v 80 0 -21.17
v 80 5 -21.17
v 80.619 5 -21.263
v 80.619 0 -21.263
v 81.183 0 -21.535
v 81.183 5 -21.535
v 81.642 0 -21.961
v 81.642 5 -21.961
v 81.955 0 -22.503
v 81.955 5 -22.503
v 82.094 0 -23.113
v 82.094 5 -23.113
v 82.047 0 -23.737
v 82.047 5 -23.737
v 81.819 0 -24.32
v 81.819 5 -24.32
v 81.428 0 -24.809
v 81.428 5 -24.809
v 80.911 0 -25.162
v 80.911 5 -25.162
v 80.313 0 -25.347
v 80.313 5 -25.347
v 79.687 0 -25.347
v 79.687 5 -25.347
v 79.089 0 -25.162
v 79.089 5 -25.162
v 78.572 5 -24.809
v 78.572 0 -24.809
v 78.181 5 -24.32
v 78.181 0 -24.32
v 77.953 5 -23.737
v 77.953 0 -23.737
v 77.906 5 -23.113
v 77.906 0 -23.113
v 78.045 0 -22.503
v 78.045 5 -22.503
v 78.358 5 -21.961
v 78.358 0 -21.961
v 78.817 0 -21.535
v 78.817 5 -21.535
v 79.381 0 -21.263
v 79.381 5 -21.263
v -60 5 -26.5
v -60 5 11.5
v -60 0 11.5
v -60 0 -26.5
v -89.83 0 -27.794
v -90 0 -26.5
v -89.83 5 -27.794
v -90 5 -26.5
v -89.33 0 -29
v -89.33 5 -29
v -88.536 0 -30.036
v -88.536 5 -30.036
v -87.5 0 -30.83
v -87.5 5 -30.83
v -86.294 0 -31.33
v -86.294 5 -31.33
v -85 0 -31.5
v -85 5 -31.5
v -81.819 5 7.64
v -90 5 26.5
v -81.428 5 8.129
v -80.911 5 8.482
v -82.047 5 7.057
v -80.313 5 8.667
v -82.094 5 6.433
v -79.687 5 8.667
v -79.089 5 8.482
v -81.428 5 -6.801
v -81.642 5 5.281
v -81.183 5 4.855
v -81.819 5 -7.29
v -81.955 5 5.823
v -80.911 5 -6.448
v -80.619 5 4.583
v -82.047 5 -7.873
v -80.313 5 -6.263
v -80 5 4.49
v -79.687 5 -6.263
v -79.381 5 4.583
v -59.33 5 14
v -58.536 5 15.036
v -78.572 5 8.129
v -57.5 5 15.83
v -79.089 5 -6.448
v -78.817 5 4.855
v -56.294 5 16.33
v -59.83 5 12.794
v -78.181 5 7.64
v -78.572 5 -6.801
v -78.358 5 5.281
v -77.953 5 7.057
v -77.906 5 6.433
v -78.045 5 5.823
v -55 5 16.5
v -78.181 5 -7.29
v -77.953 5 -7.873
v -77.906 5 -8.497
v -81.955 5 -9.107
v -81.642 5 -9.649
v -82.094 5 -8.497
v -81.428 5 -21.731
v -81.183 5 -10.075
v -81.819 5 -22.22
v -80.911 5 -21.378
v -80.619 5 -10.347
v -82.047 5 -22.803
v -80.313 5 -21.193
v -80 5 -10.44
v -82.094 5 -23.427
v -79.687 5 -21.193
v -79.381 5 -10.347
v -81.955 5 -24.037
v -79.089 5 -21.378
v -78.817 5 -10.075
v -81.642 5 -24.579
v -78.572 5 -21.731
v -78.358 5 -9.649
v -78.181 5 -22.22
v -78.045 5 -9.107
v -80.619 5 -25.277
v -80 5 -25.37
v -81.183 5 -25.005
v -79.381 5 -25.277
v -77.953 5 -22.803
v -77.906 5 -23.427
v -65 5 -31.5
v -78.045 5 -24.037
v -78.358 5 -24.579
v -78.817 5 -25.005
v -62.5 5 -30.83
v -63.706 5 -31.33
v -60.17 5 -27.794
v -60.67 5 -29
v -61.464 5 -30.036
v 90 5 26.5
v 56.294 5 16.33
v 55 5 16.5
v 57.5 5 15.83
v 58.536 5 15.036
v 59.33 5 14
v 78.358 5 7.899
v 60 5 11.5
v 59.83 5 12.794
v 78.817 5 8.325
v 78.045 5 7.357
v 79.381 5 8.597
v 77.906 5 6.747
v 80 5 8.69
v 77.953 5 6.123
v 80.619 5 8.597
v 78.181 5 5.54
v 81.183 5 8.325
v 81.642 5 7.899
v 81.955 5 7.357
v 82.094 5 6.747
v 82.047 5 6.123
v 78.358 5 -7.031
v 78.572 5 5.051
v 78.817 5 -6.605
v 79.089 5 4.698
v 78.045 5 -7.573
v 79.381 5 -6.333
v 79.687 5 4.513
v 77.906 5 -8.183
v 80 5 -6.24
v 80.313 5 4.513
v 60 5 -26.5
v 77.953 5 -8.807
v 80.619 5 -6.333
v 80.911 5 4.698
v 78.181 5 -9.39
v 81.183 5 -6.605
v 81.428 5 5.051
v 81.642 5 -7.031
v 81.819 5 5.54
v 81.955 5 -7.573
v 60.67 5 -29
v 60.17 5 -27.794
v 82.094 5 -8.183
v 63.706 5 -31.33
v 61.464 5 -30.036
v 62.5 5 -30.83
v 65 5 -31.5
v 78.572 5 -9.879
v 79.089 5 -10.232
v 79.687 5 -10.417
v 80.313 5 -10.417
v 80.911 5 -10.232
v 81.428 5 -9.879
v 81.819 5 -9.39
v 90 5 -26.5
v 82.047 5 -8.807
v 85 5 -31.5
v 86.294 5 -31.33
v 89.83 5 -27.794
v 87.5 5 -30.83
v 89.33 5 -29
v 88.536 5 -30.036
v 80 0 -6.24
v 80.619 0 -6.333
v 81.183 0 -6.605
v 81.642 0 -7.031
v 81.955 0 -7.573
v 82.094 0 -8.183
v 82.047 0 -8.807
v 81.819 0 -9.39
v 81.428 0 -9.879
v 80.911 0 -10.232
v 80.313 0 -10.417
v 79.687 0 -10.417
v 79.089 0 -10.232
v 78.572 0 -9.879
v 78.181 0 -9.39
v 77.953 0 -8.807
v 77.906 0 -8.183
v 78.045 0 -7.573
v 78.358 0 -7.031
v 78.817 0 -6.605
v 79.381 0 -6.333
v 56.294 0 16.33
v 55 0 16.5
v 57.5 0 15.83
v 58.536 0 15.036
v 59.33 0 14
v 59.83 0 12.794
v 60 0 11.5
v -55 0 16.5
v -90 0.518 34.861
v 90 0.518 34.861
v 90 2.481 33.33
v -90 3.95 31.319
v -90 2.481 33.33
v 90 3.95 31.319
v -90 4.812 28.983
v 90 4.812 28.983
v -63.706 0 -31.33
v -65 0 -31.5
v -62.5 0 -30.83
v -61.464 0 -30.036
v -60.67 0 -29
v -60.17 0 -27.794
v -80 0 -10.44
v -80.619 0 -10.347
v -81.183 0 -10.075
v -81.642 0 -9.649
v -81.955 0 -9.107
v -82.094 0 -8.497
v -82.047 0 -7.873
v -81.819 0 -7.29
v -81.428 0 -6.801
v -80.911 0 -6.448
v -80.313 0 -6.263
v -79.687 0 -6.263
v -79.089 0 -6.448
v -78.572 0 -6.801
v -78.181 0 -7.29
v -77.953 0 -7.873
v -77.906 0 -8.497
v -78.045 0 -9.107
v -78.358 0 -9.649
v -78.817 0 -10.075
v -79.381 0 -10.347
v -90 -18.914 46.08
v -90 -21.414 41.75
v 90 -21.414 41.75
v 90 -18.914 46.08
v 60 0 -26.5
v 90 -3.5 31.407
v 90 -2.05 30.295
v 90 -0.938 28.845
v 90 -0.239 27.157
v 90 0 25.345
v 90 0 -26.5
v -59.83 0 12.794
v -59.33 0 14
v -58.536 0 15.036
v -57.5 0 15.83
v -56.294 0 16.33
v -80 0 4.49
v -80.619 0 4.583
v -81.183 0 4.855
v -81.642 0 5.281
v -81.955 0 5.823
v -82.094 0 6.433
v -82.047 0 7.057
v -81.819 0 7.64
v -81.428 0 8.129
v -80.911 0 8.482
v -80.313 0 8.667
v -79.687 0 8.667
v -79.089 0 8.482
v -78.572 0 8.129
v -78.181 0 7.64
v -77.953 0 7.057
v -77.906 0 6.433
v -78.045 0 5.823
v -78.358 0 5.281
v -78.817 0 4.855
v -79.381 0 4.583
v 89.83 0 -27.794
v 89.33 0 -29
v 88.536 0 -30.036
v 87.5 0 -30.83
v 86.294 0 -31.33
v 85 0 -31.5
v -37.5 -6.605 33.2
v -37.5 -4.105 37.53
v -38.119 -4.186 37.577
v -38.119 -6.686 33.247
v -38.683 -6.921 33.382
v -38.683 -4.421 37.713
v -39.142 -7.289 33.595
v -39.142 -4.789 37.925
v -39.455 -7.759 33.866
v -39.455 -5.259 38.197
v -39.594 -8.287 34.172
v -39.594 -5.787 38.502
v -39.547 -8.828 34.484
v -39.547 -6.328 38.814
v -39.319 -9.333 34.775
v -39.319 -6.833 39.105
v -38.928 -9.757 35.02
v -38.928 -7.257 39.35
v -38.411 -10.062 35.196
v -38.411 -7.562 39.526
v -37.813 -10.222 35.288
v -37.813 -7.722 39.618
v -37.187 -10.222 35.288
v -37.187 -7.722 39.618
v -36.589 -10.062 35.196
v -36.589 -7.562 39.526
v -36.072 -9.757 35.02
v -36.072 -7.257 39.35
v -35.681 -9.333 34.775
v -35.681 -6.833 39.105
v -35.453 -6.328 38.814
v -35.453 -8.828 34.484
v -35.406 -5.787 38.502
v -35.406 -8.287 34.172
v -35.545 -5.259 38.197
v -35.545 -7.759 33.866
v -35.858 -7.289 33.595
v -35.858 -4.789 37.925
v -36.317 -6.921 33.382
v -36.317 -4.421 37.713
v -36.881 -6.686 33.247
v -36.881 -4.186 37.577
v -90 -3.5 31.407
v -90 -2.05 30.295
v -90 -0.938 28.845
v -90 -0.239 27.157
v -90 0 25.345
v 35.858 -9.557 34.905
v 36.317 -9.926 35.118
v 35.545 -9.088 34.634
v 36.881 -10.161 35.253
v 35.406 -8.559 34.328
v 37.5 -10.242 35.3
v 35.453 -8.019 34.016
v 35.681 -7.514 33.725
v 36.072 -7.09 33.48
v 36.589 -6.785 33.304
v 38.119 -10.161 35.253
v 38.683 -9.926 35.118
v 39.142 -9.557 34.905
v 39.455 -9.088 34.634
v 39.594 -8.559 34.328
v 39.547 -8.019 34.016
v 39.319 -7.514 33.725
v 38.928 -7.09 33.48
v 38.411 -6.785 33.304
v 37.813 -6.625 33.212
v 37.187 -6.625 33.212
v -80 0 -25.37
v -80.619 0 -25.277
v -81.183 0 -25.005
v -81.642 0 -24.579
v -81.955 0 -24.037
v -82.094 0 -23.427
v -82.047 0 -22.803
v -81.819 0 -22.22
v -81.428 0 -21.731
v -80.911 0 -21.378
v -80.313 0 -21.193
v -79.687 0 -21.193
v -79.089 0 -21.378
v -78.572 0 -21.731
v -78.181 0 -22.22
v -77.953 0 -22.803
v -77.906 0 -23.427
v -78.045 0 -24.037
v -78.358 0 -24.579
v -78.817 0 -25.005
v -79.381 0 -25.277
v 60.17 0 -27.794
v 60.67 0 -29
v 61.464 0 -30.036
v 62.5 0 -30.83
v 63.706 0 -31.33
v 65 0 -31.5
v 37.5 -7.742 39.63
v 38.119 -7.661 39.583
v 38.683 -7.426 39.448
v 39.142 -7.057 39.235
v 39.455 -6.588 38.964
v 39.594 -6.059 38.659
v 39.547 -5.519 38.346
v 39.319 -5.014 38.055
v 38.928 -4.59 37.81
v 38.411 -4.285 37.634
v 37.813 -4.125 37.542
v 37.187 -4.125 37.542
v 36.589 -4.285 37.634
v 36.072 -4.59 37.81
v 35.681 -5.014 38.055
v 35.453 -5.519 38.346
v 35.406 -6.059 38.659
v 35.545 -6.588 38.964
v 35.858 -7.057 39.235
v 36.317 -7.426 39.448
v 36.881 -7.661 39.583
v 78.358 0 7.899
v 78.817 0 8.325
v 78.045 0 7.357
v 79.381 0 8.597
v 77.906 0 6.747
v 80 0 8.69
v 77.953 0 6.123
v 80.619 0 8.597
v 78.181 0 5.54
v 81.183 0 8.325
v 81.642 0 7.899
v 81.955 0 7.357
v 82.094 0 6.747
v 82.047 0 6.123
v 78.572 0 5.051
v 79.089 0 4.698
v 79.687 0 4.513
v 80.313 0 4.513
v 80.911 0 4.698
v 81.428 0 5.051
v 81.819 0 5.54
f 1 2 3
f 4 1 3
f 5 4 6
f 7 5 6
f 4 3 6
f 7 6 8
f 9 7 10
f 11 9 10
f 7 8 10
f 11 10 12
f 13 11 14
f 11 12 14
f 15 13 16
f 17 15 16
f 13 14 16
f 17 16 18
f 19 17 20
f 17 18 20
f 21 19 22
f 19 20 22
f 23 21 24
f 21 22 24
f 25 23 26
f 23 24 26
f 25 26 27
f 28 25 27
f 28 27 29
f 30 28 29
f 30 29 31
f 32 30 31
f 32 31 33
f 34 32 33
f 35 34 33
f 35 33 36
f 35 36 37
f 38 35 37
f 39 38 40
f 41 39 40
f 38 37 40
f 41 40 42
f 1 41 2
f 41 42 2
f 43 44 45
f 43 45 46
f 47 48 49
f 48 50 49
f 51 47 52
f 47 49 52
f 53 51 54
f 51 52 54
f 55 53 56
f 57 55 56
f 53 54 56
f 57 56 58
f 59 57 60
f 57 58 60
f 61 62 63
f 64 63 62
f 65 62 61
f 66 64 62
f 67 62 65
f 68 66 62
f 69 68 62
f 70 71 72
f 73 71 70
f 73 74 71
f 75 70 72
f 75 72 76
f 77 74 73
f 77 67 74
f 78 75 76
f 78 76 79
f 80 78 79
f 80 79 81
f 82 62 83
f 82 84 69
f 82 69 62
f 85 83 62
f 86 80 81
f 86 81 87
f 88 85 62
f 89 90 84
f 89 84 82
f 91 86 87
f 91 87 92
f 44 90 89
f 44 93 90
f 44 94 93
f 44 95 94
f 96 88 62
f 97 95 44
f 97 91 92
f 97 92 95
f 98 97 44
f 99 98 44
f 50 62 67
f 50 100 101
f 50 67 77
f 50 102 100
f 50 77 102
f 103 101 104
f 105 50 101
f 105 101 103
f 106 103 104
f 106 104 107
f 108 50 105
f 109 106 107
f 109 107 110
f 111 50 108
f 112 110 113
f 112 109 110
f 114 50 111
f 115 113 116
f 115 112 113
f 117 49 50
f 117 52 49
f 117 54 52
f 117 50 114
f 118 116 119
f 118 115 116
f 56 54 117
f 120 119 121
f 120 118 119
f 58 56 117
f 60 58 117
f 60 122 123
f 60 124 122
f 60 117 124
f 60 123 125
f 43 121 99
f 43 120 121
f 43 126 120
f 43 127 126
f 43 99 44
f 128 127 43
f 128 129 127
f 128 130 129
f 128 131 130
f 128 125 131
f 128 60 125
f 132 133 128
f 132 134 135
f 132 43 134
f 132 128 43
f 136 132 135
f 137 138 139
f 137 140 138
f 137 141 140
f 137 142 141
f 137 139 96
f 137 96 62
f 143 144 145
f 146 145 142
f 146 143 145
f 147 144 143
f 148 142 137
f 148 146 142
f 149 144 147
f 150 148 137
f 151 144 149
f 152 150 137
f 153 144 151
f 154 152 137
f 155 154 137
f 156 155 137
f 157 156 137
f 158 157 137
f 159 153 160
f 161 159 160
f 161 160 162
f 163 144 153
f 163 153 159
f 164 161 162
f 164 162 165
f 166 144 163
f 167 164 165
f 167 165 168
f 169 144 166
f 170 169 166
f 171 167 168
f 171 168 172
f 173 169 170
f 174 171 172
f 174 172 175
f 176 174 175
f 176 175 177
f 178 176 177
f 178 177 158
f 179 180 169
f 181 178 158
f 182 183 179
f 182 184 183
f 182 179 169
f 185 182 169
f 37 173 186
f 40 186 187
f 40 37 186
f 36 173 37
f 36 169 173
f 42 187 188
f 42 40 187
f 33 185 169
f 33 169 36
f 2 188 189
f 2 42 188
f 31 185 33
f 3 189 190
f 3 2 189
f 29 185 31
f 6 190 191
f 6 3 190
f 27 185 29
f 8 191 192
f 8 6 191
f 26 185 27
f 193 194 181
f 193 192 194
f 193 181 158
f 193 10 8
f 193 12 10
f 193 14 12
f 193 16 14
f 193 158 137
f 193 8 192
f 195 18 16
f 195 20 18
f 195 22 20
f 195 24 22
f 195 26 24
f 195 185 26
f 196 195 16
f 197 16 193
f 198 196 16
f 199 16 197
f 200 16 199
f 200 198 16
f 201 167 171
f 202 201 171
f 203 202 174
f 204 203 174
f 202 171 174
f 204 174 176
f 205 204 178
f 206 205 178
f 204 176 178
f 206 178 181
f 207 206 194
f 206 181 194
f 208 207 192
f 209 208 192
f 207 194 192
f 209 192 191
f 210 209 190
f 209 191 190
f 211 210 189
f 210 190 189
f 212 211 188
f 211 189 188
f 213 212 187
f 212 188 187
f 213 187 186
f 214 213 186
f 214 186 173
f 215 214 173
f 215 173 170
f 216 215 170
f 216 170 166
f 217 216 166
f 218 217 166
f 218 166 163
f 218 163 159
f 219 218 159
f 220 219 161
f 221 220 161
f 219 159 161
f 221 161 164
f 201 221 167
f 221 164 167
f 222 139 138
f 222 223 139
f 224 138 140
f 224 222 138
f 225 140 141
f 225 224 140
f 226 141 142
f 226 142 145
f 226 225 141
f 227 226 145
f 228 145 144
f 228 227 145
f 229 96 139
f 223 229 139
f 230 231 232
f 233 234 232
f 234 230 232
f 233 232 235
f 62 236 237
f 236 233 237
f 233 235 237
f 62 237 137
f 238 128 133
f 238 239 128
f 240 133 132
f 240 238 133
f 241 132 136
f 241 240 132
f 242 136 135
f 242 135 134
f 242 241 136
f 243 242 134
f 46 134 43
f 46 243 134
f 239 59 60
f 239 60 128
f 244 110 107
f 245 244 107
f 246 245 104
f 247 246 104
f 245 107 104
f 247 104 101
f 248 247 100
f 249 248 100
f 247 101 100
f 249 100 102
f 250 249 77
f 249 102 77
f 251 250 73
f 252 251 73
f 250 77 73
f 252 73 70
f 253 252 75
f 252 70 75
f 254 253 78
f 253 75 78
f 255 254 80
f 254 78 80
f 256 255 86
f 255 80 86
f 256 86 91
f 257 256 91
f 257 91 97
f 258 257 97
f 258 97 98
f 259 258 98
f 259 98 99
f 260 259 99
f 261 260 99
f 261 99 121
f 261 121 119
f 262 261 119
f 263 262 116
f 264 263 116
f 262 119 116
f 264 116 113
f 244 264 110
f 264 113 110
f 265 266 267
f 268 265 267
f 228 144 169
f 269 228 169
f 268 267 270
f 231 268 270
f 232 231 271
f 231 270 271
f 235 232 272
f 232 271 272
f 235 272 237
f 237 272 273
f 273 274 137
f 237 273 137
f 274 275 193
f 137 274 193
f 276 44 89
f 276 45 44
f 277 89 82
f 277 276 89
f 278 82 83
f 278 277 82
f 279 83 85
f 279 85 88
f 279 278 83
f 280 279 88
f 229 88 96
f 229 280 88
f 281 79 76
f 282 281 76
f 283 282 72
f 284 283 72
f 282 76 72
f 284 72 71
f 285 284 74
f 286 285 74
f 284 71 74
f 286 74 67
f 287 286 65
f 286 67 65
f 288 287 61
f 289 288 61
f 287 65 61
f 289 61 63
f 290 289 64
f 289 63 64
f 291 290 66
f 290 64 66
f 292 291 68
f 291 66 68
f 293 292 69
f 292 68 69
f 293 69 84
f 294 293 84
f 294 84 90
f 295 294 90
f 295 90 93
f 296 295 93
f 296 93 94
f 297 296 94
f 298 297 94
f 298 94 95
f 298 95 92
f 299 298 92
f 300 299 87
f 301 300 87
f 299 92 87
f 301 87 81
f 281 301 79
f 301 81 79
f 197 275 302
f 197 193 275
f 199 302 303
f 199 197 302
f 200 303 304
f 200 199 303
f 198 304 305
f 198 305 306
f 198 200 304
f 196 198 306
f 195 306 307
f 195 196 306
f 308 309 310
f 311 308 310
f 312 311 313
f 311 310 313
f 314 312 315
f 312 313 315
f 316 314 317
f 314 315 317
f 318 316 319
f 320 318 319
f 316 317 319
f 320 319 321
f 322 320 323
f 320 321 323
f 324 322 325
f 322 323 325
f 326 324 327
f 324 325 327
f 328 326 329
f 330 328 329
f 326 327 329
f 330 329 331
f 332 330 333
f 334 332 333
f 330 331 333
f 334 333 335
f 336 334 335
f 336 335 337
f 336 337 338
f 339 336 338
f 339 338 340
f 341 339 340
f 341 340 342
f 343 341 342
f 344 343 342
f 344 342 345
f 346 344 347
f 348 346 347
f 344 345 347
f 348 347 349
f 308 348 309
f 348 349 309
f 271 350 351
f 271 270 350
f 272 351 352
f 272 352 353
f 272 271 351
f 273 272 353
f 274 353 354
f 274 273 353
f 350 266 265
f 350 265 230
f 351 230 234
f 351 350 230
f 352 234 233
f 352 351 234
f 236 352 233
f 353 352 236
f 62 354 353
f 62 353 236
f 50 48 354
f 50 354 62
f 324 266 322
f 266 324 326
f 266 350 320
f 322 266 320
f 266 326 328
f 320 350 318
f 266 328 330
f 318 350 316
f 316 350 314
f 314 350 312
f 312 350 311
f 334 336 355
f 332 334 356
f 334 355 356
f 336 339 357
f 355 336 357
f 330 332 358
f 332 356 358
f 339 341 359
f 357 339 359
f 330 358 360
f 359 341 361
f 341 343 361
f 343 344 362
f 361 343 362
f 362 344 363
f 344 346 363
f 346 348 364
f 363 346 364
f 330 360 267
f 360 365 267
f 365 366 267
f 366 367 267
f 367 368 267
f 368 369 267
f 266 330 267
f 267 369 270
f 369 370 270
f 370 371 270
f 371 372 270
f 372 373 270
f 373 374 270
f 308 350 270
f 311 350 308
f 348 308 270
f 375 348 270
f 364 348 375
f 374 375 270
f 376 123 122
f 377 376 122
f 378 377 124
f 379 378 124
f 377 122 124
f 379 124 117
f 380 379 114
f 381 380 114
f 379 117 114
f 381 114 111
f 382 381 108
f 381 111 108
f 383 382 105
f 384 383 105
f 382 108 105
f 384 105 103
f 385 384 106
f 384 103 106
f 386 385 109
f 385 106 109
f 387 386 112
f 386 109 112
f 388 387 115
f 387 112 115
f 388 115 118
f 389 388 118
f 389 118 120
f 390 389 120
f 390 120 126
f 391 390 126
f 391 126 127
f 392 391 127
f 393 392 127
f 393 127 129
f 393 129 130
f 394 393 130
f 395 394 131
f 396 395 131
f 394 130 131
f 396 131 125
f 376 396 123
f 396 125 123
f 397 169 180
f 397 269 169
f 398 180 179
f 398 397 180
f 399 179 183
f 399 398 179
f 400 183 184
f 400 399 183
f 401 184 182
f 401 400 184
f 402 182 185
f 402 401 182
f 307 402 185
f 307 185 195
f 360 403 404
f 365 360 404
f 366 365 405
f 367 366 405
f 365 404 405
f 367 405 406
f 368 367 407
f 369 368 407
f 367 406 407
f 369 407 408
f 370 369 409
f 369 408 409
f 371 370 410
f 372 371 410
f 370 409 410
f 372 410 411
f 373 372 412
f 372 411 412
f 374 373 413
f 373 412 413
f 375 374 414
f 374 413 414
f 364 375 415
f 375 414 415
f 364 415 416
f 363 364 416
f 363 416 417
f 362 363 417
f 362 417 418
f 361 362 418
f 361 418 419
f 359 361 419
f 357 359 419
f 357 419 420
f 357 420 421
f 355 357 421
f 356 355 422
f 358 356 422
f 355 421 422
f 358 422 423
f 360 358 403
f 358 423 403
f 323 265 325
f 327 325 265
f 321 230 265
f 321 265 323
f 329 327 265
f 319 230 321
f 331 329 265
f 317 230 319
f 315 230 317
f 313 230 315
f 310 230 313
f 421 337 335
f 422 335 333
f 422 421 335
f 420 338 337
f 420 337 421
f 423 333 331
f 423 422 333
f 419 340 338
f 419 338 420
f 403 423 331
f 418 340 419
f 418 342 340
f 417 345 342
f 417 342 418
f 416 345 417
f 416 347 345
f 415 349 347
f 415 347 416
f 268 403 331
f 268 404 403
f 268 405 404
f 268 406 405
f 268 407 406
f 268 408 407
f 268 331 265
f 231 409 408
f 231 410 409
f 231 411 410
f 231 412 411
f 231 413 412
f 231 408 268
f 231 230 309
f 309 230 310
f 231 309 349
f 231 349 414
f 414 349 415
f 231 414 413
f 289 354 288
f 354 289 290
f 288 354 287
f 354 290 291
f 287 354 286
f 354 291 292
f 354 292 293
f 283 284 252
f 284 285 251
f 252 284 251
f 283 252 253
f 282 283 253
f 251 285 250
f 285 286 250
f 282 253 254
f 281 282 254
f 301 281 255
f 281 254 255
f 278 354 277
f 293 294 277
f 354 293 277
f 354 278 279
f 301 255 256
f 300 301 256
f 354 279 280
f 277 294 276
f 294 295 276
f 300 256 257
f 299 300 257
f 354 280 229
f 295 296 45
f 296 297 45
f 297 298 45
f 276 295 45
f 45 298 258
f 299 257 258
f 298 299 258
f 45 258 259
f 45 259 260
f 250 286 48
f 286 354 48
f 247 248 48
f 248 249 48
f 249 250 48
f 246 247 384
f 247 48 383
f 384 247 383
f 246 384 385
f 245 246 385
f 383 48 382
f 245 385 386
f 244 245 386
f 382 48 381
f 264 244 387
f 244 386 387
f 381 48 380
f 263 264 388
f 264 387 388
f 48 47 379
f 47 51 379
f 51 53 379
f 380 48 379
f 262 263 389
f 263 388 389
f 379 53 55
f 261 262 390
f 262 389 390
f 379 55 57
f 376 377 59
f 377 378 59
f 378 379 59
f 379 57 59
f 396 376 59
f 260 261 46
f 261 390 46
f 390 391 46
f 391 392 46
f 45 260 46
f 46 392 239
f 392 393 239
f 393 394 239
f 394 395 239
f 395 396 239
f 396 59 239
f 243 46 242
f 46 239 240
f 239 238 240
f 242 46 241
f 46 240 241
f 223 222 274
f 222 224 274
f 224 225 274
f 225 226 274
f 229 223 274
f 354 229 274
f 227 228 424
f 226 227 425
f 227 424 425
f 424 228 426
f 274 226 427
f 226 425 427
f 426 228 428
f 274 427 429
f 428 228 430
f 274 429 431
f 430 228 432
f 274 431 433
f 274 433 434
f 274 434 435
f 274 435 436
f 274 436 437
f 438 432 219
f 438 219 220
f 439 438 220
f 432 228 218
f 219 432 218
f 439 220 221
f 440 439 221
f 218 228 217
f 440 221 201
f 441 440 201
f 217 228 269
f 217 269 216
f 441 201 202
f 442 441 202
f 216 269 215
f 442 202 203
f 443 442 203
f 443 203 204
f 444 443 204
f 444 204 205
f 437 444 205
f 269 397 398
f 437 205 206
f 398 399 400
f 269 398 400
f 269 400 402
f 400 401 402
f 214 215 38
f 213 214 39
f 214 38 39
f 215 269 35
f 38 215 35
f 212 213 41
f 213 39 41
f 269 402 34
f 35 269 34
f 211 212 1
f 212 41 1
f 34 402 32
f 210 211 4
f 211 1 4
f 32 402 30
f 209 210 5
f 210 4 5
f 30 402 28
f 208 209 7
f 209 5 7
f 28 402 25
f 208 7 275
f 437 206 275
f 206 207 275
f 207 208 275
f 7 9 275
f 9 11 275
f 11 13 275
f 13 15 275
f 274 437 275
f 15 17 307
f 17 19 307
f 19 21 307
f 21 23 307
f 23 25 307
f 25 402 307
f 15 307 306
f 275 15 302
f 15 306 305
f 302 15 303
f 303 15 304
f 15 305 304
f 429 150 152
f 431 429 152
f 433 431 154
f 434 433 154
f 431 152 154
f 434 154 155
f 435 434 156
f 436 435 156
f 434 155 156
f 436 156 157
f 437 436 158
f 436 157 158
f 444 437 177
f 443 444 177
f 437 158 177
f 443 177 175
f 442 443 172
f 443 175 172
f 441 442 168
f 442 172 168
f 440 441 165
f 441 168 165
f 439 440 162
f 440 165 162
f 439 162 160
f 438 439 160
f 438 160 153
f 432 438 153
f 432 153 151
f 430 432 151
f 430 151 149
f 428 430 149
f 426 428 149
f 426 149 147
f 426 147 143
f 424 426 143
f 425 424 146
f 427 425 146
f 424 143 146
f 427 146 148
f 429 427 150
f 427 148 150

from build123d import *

# Parameters (mm, degrees)
SKETCH_1_W          = 180
SKETCH_1_H          = 63
EXTRUDE_1_DEPTH     = 5
SKETCH_2_R          = 2.1
CUT_EXTRUDE_1_DEPTH = 5
CUT_EXTRUDE_2_DEPTH = 200
SKETCH_5_W          = 180
SKETCH_5_H          = 30.5
EXTRUDE_2_DEPTH     = 5
SKETCH_7_R          = 2.1
CUT_EXTRUDE_3_DEPTH = 5
FILLET_3_R          = 9
FILLET_4_R          = 7
SKETCH_8_W          = 120
SKETCH_8_H          = 50
CUT_EXTRUDE_4_DEPTH = 5
FILLET_5_R          = 5


with BuildPart() as part:
    # 草图1 → 凸台-拉伸1 (new body)
    with BuildSketch(Plane(origin=(0, 0, 0), x_dir=(1, 0, 0), z_dir=(0, 1, 0))):
        Rectangle(SKETCH_1_W, SKETCH_1_H)
    extrude(amount=EXTRUDE_1_DEPTH)

    # 草图2 → 切除-拉伸1 (cut)
    with BuildSketch(Plane(origin=(0, 5, 0), x_dir=(1, 0, 0), z_dir=(0, 1, 0))):
        with Locations(Location((80, 23.27, 0), (0, 0, 270))):
            Circle(SKETCH_2_R)
        with Locations(Location((80, 8.34, 0), (0, 0, 270))):
            Circle(SKETCH_2_R)
        with Locations(Location((80, -6.59, 0), (0, 0, 270))):
            Circle(SKETCH_2_R)
        with Locations(Location((-80, 23.27, 0), (0, 0, 90))):
            Circle(SKETCH_2_R)
        with Locations(Location((-80, 8.34, 0), (0, 0, 90))):
            Circle(SKETCH_2_R)
        with Locations(Location((-80, -6.59, 0), (0, 0, 90))):
            Circle(SKETCH_2_R)
    extrude(amount=-CUT_EXTRUDE_1_DEPTH, mode=Mode.SUBTRACT)

    # 草图3 → 切除-拉伸2 (cut)
    with BuildSketch(Plane.ZY.offset(90)):
        Polygon((26.5, 5), (29.386751346, 0), (31.5, 0), (31.5, 5), align=None)
    extrude(amount=-CUT_EXTRUDE_2_DEPTH, mode=Mode.SUBTRACT)

    # 草图5 → 凸台-拉伸2 (add)
    with BuildSketch(Plane(origin=(0, 12.7248366, 22.040063509), x_dir=(1, 0, 0), z_dir=(0, 0.49999999999999806, 0.8660254037844399))):
        with Locations((0, -24.169872981)):
            Rectangle(SKETCH_5_W, SKETCH_5_H)
    extrude(amount=EXTRUDE_2_DEPTH)

    # 草图7 → 切除-拉伸3 (cut)
    with BuildSketch(Plane(origin=(0, 15.2248366, 26.370190528), x_dir=(1, 0, 0), z_dir=(0, 0.4999999999999981, 0.8660254037844397))):
        with Locations(Location((37.5, -24.419872981, 0), (0, 0, 270))):
            Circle(SKETCH_7_R)
        with Locations(Location((-37.5, -24.419872981, 0), (0, 0, 90))):
            Circle(SKETCH_7_R)
    extrude(amount=-CUT_EXTRUDE_3_DEPTH, mode=Mode.SUBTRACT)

    # 圆角3
    # the kernel refuses this fillet: 9 mm, written as the material it takes off along each edge
    with BuildSketch(Plane(origin=(110.155644371, 7.5, 30.830127019), x_dir=(0, -0.8660254037844398, 0.499999999999998), z_dir=(-1, 0, 0))) as fillet_3_piece_1:
        with BuildLine():
            CenterArc((8.062257748, -9), FILLET_3_R, 90, 63.612200039)
            Line((0, -5), (-0.161245155, -4.92))
            ThreePointArc((-0.161245155, -4.92), (-0.18, -2.5), (-0.18, 0))
            Line((-0.18, 0), (0, 0.18))
            Line((0, 0.18), (8.062257748, 0.18))
            Line((8.062257748, 0.18), (8.062257748, 0))
        make_face()
    extrude(amount=220.311288741, mode=Mode.SUBTRACT)

    # 圆角4
    fillet_4_edges = [part.edges().sort_by_distance(p)[0] for p in [
        (0, 0, 29.386751346),
    ]]
    fillet(fillet_4_edges, radius=FILLET_4_R)

    # 草图8 → 切除-拉伸4 (cut)
    with BuildSketch(Plane(origin=(0, 5, 0), x_dir=(1, 0, 0), z_dir=(0, 1, 0))):
        with Locations((0, 8.5)):
            Rectangle(SKETCH_8_W, SKETCH_8_H)
    extrude(amount=-CUT_EXTRUDE_4_DEPTH, mode=Mode.SUBTRACT)

    # 圆角5
    fillet_5_edges = [part.edges().sort_by_distance(p)[0] for p in [
        (60, 2.5, -31.5),
        (-60, 2.5, -31.5),
        (-60, 2.5, 16.5),
        (60, 2.5, 16.5),
        (-90, 2.5, -31.5),
        (90, 2.5, -31.5),
    ]]
    fillet(fillet_5_edges, radius=FILLET_5_R)


solid = part.part
